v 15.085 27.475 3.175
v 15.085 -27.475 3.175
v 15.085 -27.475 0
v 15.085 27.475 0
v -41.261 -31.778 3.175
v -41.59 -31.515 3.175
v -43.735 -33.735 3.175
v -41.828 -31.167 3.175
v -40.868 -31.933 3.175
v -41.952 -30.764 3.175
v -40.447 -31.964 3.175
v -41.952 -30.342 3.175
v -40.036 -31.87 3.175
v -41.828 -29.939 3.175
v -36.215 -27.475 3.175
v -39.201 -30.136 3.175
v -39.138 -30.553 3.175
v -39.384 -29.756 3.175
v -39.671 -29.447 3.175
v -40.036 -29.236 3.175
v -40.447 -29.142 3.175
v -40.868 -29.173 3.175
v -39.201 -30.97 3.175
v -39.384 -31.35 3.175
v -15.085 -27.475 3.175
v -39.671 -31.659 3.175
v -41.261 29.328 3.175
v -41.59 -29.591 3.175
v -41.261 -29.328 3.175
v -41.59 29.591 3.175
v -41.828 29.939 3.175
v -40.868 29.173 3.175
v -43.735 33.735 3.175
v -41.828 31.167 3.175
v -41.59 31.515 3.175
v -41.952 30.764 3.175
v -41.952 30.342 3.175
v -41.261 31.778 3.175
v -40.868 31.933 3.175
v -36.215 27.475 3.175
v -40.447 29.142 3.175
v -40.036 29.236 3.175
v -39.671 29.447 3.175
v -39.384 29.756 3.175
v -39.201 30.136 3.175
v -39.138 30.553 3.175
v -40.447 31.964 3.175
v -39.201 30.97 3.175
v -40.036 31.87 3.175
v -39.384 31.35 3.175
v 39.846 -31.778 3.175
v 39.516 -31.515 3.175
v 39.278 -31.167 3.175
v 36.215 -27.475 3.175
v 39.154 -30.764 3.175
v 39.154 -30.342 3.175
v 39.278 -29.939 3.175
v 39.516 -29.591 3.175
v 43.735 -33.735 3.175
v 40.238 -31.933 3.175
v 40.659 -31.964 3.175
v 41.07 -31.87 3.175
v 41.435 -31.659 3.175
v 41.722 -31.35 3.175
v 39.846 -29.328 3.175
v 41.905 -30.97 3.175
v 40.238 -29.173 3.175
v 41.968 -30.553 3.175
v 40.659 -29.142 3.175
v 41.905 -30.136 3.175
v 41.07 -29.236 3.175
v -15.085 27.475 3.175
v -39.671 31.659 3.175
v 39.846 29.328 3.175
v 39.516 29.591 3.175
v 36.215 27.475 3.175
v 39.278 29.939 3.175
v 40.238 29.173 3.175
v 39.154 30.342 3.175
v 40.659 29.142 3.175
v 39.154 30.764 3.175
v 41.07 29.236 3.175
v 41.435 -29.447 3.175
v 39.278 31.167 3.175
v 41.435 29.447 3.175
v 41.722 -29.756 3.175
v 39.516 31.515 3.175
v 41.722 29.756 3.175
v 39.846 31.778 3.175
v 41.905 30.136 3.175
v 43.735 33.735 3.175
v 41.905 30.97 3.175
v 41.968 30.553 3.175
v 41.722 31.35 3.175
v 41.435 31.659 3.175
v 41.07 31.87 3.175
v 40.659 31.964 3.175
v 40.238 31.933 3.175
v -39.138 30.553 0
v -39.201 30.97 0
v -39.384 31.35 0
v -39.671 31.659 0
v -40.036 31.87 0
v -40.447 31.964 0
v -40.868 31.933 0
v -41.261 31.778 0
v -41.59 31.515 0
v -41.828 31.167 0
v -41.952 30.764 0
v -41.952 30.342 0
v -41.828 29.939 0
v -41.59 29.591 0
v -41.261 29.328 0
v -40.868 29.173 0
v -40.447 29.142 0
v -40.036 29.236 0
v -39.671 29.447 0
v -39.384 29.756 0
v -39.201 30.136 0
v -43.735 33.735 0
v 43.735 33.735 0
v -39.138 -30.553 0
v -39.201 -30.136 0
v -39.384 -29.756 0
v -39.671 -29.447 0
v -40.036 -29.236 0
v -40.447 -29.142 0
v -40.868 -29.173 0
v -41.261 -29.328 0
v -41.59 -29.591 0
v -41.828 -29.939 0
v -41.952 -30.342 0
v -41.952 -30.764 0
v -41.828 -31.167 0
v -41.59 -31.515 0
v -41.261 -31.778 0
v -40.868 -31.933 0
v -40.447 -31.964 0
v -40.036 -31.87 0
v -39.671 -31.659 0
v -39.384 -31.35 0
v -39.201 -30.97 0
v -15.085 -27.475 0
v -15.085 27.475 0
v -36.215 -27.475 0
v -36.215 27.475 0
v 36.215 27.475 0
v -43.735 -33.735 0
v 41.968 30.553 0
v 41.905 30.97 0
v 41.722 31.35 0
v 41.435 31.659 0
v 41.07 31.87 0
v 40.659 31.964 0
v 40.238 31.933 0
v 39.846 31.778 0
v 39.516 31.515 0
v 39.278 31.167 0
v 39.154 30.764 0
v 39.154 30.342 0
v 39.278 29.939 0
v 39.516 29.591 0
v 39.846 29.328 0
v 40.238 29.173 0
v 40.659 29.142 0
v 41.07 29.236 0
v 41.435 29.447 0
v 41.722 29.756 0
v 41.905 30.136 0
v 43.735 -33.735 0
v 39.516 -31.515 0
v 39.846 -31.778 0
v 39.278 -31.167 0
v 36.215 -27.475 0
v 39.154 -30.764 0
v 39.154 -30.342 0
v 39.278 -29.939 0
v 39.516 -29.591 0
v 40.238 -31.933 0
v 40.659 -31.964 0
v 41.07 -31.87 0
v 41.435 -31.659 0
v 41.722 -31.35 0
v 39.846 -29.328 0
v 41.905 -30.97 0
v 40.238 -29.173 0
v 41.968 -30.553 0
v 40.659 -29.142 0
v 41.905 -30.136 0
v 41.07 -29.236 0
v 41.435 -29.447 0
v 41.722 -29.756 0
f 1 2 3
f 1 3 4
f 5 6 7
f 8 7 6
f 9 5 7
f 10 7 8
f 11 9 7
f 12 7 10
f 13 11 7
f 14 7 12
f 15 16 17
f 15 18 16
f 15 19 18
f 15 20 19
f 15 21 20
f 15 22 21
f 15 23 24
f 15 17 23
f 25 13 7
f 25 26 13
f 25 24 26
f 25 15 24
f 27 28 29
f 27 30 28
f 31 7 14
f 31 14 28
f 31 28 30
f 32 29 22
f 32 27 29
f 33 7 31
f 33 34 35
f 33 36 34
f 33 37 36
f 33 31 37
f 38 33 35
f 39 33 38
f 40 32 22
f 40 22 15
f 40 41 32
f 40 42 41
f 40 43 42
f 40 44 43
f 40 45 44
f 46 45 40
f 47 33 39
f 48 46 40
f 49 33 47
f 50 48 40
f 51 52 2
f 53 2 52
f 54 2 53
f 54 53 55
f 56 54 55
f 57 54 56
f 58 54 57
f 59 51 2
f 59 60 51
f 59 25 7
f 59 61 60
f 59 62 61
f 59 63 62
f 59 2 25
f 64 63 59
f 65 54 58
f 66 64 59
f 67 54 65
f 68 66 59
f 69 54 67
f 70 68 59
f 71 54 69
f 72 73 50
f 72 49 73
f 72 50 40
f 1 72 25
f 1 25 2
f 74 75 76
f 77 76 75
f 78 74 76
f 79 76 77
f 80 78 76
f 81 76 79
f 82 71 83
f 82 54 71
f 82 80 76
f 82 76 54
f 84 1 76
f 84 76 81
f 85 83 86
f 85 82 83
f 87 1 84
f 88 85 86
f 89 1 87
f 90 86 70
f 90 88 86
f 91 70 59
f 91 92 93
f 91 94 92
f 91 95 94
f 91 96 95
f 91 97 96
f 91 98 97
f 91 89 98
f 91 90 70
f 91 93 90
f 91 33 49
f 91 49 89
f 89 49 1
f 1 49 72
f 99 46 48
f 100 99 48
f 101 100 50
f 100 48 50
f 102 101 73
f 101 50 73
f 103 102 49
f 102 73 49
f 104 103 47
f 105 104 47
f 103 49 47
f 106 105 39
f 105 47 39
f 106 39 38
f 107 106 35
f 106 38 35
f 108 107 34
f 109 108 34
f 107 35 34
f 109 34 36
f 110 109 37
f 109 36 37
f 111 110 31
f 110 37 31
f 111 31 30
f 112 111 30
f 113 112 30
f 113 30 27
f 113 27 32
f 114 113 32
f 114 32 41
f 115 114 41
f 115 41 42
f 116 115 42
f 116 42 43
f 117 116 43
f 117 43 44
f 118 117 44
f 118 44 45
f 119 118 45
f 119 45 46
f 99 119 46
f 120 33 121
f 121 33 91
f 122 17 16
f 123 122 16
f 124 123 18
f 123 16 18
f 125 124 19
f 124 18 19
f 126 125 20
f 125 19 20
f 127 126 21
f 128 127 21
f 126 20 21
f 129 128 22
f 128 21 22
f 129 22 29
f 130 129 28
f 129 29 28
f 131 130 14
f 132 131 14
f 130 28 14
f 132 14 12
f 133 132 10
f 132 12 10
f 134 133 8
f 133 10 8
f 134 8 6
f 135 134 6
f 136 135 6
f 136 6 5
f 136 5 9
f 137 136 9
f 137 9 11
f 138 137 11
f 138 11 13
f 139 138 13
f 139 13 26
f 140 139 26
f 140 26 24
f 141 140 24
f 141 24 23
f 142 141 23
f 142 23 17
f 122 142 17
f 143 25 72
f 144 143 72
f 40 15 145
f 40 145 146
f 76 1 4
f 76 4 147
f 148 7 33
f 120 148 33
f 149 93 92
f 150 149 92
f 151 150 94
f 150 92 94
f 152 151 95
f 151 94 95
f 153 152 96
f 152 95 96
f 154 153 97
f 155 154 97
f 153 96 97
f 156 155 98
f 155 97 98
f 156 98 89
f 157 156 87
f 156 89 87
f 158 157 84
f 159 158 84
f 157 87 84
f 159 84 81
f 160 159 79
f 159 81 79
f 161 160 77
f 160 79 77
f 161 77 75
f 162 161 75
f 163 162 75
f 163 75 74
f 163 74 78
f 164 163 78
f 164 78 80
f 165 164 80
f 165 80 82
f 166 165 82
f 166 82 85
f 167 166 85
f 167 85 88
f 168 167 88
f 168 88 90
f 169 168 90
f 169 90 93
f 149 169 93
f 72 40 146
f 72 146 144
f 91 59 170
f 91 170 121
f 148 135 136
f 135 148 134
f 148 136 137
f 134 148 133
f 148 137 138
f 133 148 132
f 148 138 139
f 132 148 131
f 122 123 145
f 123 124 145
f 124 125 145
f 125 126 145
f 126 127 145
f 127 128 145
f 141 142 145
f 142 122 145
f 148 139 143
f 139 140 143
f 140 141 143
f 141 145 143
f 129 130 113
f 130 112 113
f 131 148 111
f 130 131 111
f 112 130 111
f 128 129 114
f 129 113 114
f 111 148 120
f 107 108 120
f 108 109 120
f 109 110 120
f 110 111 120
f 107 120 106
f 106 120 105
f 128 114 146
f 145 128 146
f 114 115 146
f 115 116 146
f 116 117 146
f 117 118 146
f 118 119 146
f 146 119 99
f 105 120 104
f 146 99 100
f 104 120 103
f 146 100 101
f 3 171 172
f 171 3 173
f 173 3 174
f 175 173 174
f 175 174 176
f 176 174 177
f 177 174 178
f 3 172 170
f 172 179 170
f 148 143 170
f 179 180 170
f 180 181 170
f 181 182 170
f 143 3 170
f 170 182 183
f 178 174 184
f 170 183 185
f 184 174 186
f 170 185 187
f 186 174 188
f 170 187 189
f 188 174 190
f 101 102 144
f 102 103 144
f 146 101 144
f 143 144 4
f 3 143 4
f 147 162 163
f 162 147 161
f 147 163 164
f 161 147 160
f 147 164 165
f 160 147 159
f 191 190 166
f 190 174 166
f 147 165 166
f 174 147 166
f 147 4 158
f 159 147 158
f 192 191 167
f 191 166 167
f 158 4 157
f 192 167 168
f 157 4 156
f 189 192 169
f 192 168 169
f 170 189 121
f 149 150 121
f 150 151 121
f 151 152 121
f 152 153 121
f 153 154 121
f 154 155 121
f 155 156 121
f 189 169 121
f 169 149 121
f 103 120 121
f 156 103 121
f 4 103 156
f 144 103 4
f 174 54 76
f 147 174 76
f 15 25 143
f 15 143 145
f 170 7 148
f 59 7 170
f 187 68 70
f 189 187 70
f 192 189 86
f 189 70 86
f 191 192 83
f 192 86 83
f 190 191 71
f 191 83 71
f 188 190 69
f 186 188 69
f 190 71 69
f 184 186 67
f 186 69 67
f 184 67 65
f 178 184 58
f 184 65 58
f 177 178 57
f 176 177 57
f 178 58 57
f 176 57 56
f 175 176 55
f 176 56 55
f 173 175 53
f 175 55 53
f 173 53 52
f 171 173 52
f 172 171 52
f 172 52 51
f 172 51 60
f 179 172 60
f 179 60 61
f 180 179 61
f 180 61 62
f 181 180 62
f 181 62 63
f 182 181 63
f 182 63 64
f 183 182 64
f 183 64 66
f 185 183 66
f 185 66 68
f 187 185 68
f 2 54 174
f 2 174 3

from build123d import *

# Parameters (mm, degrees)
SKETCH1_W           = 100
SKETCH1_H           = 80
BOSS_EXTRUDE1_DEPTH = 3.175
SKETCH4_W           = 100.51
SKETCH4_H           = 80.51
SKETCH4_W_2         = 87.47
SKETCH4_H_2         = 67.47
CUT_EXTRUDE3_DEPTH  = 10
SKETCH5_R           = 1.415
CUT_EXTRUDE4_DEPTH  = 10
SKETCH2_W           = 21.13
SKETCH2_H           = 65.13
CUT_EXTRUDE5_DEPTH  = 10
BOSS_EXTRUDE2_DEPTH = 3.175


with BuildPart() as part:
    # Sketch1 → Boss-Extrude1 (new body)
    with BuildSketch(Plane.XY):
        Rectangle(SKETCH1_W, SKETCH1_H)
    extrude(amount=BOSS_EXTRUDE1_DEPTH)

    # Sketch4 → Cut-Extrude3 (cut)
    with BuildSketch(Plane.XY.offset(3.175)):
        Rectangle(SKETCH4_W, SKETCH4_H)
        Rectangle(SKETCH4_W_2, SKETCH4_H_2, mode=Mode.SUBTRACT)
    extrude(amount=-CUT_EXTRUDE3_DEPTH, mode=Mode.SUBTRACT)

    # Sketch5 → Cut-Extrude4 (cut)
    with BuildSketch(Plane.XY.offset(3.175)):
        with Locations((-40.553019485, 30.553019485)):
            Circle(SKETCH5_R)
        with Locations((-40.553019485, -30.553019485)):
            Circle(SKETCH5_R)
        with Locations((40.553019485, -30.553019485)):
            Circle(SKETCH5_R)
        with Locations((40.553019485, 30.553019485)):
            Circle(SKETCH5_R)
    extrude(amount=-CUT_EXTRUDE4_DEPTH, mode=Mode.SUBTRACT)

    # Sketch2 → Cut-Extrude5 (cut)
    with BuildSketch(Plane.XY.offset(3.175)):
        with Locations((-25.65, 0)):
            Rectangle(SKETCH2_W, SKETCH2_H)
        with Locations((25.65, 0)):
            Rectangle(SKETCH2_W, SKETCH2_H)
    extrude(amount=-CUT_EXTRUDE5_DEPTH, mode=Mode.SUBTRACT)

    # Sketch6 → Boss-Extrude2 (add)
    with BuildSketch(Plane.XY.offset(3.175)):
        Polygon((-25.65, -32.565), (-15.085, -32.565), (-15.085, -27.475), (-25.65, -27.475), (-36.215, -27.475), (-36.215, -32.565), align=None)
        Polygon((25.65, -32.565), (36.215, -32.565), (36.215, -27.475), (25.65, -27.475), (15.085, -27.475), (15.085, -32.565), align=None)
        Polygon((15.085, 27.475), (15.085, 32.565), (25.65, 32.565), (36.215, 32.565), (36.215, 27.475), (25.65, 27.475), align=None)
        Polygon((-36.215, 27.475), (-36.215, 32.565), (-25.65, 32.565), (-15.085, 32.565), (-15.085, 27.475), (-25.65, 27.475), align=None)
    extrude(amount=-BOSS_EXTRUDE2_DEPTH)


solid = part.part
